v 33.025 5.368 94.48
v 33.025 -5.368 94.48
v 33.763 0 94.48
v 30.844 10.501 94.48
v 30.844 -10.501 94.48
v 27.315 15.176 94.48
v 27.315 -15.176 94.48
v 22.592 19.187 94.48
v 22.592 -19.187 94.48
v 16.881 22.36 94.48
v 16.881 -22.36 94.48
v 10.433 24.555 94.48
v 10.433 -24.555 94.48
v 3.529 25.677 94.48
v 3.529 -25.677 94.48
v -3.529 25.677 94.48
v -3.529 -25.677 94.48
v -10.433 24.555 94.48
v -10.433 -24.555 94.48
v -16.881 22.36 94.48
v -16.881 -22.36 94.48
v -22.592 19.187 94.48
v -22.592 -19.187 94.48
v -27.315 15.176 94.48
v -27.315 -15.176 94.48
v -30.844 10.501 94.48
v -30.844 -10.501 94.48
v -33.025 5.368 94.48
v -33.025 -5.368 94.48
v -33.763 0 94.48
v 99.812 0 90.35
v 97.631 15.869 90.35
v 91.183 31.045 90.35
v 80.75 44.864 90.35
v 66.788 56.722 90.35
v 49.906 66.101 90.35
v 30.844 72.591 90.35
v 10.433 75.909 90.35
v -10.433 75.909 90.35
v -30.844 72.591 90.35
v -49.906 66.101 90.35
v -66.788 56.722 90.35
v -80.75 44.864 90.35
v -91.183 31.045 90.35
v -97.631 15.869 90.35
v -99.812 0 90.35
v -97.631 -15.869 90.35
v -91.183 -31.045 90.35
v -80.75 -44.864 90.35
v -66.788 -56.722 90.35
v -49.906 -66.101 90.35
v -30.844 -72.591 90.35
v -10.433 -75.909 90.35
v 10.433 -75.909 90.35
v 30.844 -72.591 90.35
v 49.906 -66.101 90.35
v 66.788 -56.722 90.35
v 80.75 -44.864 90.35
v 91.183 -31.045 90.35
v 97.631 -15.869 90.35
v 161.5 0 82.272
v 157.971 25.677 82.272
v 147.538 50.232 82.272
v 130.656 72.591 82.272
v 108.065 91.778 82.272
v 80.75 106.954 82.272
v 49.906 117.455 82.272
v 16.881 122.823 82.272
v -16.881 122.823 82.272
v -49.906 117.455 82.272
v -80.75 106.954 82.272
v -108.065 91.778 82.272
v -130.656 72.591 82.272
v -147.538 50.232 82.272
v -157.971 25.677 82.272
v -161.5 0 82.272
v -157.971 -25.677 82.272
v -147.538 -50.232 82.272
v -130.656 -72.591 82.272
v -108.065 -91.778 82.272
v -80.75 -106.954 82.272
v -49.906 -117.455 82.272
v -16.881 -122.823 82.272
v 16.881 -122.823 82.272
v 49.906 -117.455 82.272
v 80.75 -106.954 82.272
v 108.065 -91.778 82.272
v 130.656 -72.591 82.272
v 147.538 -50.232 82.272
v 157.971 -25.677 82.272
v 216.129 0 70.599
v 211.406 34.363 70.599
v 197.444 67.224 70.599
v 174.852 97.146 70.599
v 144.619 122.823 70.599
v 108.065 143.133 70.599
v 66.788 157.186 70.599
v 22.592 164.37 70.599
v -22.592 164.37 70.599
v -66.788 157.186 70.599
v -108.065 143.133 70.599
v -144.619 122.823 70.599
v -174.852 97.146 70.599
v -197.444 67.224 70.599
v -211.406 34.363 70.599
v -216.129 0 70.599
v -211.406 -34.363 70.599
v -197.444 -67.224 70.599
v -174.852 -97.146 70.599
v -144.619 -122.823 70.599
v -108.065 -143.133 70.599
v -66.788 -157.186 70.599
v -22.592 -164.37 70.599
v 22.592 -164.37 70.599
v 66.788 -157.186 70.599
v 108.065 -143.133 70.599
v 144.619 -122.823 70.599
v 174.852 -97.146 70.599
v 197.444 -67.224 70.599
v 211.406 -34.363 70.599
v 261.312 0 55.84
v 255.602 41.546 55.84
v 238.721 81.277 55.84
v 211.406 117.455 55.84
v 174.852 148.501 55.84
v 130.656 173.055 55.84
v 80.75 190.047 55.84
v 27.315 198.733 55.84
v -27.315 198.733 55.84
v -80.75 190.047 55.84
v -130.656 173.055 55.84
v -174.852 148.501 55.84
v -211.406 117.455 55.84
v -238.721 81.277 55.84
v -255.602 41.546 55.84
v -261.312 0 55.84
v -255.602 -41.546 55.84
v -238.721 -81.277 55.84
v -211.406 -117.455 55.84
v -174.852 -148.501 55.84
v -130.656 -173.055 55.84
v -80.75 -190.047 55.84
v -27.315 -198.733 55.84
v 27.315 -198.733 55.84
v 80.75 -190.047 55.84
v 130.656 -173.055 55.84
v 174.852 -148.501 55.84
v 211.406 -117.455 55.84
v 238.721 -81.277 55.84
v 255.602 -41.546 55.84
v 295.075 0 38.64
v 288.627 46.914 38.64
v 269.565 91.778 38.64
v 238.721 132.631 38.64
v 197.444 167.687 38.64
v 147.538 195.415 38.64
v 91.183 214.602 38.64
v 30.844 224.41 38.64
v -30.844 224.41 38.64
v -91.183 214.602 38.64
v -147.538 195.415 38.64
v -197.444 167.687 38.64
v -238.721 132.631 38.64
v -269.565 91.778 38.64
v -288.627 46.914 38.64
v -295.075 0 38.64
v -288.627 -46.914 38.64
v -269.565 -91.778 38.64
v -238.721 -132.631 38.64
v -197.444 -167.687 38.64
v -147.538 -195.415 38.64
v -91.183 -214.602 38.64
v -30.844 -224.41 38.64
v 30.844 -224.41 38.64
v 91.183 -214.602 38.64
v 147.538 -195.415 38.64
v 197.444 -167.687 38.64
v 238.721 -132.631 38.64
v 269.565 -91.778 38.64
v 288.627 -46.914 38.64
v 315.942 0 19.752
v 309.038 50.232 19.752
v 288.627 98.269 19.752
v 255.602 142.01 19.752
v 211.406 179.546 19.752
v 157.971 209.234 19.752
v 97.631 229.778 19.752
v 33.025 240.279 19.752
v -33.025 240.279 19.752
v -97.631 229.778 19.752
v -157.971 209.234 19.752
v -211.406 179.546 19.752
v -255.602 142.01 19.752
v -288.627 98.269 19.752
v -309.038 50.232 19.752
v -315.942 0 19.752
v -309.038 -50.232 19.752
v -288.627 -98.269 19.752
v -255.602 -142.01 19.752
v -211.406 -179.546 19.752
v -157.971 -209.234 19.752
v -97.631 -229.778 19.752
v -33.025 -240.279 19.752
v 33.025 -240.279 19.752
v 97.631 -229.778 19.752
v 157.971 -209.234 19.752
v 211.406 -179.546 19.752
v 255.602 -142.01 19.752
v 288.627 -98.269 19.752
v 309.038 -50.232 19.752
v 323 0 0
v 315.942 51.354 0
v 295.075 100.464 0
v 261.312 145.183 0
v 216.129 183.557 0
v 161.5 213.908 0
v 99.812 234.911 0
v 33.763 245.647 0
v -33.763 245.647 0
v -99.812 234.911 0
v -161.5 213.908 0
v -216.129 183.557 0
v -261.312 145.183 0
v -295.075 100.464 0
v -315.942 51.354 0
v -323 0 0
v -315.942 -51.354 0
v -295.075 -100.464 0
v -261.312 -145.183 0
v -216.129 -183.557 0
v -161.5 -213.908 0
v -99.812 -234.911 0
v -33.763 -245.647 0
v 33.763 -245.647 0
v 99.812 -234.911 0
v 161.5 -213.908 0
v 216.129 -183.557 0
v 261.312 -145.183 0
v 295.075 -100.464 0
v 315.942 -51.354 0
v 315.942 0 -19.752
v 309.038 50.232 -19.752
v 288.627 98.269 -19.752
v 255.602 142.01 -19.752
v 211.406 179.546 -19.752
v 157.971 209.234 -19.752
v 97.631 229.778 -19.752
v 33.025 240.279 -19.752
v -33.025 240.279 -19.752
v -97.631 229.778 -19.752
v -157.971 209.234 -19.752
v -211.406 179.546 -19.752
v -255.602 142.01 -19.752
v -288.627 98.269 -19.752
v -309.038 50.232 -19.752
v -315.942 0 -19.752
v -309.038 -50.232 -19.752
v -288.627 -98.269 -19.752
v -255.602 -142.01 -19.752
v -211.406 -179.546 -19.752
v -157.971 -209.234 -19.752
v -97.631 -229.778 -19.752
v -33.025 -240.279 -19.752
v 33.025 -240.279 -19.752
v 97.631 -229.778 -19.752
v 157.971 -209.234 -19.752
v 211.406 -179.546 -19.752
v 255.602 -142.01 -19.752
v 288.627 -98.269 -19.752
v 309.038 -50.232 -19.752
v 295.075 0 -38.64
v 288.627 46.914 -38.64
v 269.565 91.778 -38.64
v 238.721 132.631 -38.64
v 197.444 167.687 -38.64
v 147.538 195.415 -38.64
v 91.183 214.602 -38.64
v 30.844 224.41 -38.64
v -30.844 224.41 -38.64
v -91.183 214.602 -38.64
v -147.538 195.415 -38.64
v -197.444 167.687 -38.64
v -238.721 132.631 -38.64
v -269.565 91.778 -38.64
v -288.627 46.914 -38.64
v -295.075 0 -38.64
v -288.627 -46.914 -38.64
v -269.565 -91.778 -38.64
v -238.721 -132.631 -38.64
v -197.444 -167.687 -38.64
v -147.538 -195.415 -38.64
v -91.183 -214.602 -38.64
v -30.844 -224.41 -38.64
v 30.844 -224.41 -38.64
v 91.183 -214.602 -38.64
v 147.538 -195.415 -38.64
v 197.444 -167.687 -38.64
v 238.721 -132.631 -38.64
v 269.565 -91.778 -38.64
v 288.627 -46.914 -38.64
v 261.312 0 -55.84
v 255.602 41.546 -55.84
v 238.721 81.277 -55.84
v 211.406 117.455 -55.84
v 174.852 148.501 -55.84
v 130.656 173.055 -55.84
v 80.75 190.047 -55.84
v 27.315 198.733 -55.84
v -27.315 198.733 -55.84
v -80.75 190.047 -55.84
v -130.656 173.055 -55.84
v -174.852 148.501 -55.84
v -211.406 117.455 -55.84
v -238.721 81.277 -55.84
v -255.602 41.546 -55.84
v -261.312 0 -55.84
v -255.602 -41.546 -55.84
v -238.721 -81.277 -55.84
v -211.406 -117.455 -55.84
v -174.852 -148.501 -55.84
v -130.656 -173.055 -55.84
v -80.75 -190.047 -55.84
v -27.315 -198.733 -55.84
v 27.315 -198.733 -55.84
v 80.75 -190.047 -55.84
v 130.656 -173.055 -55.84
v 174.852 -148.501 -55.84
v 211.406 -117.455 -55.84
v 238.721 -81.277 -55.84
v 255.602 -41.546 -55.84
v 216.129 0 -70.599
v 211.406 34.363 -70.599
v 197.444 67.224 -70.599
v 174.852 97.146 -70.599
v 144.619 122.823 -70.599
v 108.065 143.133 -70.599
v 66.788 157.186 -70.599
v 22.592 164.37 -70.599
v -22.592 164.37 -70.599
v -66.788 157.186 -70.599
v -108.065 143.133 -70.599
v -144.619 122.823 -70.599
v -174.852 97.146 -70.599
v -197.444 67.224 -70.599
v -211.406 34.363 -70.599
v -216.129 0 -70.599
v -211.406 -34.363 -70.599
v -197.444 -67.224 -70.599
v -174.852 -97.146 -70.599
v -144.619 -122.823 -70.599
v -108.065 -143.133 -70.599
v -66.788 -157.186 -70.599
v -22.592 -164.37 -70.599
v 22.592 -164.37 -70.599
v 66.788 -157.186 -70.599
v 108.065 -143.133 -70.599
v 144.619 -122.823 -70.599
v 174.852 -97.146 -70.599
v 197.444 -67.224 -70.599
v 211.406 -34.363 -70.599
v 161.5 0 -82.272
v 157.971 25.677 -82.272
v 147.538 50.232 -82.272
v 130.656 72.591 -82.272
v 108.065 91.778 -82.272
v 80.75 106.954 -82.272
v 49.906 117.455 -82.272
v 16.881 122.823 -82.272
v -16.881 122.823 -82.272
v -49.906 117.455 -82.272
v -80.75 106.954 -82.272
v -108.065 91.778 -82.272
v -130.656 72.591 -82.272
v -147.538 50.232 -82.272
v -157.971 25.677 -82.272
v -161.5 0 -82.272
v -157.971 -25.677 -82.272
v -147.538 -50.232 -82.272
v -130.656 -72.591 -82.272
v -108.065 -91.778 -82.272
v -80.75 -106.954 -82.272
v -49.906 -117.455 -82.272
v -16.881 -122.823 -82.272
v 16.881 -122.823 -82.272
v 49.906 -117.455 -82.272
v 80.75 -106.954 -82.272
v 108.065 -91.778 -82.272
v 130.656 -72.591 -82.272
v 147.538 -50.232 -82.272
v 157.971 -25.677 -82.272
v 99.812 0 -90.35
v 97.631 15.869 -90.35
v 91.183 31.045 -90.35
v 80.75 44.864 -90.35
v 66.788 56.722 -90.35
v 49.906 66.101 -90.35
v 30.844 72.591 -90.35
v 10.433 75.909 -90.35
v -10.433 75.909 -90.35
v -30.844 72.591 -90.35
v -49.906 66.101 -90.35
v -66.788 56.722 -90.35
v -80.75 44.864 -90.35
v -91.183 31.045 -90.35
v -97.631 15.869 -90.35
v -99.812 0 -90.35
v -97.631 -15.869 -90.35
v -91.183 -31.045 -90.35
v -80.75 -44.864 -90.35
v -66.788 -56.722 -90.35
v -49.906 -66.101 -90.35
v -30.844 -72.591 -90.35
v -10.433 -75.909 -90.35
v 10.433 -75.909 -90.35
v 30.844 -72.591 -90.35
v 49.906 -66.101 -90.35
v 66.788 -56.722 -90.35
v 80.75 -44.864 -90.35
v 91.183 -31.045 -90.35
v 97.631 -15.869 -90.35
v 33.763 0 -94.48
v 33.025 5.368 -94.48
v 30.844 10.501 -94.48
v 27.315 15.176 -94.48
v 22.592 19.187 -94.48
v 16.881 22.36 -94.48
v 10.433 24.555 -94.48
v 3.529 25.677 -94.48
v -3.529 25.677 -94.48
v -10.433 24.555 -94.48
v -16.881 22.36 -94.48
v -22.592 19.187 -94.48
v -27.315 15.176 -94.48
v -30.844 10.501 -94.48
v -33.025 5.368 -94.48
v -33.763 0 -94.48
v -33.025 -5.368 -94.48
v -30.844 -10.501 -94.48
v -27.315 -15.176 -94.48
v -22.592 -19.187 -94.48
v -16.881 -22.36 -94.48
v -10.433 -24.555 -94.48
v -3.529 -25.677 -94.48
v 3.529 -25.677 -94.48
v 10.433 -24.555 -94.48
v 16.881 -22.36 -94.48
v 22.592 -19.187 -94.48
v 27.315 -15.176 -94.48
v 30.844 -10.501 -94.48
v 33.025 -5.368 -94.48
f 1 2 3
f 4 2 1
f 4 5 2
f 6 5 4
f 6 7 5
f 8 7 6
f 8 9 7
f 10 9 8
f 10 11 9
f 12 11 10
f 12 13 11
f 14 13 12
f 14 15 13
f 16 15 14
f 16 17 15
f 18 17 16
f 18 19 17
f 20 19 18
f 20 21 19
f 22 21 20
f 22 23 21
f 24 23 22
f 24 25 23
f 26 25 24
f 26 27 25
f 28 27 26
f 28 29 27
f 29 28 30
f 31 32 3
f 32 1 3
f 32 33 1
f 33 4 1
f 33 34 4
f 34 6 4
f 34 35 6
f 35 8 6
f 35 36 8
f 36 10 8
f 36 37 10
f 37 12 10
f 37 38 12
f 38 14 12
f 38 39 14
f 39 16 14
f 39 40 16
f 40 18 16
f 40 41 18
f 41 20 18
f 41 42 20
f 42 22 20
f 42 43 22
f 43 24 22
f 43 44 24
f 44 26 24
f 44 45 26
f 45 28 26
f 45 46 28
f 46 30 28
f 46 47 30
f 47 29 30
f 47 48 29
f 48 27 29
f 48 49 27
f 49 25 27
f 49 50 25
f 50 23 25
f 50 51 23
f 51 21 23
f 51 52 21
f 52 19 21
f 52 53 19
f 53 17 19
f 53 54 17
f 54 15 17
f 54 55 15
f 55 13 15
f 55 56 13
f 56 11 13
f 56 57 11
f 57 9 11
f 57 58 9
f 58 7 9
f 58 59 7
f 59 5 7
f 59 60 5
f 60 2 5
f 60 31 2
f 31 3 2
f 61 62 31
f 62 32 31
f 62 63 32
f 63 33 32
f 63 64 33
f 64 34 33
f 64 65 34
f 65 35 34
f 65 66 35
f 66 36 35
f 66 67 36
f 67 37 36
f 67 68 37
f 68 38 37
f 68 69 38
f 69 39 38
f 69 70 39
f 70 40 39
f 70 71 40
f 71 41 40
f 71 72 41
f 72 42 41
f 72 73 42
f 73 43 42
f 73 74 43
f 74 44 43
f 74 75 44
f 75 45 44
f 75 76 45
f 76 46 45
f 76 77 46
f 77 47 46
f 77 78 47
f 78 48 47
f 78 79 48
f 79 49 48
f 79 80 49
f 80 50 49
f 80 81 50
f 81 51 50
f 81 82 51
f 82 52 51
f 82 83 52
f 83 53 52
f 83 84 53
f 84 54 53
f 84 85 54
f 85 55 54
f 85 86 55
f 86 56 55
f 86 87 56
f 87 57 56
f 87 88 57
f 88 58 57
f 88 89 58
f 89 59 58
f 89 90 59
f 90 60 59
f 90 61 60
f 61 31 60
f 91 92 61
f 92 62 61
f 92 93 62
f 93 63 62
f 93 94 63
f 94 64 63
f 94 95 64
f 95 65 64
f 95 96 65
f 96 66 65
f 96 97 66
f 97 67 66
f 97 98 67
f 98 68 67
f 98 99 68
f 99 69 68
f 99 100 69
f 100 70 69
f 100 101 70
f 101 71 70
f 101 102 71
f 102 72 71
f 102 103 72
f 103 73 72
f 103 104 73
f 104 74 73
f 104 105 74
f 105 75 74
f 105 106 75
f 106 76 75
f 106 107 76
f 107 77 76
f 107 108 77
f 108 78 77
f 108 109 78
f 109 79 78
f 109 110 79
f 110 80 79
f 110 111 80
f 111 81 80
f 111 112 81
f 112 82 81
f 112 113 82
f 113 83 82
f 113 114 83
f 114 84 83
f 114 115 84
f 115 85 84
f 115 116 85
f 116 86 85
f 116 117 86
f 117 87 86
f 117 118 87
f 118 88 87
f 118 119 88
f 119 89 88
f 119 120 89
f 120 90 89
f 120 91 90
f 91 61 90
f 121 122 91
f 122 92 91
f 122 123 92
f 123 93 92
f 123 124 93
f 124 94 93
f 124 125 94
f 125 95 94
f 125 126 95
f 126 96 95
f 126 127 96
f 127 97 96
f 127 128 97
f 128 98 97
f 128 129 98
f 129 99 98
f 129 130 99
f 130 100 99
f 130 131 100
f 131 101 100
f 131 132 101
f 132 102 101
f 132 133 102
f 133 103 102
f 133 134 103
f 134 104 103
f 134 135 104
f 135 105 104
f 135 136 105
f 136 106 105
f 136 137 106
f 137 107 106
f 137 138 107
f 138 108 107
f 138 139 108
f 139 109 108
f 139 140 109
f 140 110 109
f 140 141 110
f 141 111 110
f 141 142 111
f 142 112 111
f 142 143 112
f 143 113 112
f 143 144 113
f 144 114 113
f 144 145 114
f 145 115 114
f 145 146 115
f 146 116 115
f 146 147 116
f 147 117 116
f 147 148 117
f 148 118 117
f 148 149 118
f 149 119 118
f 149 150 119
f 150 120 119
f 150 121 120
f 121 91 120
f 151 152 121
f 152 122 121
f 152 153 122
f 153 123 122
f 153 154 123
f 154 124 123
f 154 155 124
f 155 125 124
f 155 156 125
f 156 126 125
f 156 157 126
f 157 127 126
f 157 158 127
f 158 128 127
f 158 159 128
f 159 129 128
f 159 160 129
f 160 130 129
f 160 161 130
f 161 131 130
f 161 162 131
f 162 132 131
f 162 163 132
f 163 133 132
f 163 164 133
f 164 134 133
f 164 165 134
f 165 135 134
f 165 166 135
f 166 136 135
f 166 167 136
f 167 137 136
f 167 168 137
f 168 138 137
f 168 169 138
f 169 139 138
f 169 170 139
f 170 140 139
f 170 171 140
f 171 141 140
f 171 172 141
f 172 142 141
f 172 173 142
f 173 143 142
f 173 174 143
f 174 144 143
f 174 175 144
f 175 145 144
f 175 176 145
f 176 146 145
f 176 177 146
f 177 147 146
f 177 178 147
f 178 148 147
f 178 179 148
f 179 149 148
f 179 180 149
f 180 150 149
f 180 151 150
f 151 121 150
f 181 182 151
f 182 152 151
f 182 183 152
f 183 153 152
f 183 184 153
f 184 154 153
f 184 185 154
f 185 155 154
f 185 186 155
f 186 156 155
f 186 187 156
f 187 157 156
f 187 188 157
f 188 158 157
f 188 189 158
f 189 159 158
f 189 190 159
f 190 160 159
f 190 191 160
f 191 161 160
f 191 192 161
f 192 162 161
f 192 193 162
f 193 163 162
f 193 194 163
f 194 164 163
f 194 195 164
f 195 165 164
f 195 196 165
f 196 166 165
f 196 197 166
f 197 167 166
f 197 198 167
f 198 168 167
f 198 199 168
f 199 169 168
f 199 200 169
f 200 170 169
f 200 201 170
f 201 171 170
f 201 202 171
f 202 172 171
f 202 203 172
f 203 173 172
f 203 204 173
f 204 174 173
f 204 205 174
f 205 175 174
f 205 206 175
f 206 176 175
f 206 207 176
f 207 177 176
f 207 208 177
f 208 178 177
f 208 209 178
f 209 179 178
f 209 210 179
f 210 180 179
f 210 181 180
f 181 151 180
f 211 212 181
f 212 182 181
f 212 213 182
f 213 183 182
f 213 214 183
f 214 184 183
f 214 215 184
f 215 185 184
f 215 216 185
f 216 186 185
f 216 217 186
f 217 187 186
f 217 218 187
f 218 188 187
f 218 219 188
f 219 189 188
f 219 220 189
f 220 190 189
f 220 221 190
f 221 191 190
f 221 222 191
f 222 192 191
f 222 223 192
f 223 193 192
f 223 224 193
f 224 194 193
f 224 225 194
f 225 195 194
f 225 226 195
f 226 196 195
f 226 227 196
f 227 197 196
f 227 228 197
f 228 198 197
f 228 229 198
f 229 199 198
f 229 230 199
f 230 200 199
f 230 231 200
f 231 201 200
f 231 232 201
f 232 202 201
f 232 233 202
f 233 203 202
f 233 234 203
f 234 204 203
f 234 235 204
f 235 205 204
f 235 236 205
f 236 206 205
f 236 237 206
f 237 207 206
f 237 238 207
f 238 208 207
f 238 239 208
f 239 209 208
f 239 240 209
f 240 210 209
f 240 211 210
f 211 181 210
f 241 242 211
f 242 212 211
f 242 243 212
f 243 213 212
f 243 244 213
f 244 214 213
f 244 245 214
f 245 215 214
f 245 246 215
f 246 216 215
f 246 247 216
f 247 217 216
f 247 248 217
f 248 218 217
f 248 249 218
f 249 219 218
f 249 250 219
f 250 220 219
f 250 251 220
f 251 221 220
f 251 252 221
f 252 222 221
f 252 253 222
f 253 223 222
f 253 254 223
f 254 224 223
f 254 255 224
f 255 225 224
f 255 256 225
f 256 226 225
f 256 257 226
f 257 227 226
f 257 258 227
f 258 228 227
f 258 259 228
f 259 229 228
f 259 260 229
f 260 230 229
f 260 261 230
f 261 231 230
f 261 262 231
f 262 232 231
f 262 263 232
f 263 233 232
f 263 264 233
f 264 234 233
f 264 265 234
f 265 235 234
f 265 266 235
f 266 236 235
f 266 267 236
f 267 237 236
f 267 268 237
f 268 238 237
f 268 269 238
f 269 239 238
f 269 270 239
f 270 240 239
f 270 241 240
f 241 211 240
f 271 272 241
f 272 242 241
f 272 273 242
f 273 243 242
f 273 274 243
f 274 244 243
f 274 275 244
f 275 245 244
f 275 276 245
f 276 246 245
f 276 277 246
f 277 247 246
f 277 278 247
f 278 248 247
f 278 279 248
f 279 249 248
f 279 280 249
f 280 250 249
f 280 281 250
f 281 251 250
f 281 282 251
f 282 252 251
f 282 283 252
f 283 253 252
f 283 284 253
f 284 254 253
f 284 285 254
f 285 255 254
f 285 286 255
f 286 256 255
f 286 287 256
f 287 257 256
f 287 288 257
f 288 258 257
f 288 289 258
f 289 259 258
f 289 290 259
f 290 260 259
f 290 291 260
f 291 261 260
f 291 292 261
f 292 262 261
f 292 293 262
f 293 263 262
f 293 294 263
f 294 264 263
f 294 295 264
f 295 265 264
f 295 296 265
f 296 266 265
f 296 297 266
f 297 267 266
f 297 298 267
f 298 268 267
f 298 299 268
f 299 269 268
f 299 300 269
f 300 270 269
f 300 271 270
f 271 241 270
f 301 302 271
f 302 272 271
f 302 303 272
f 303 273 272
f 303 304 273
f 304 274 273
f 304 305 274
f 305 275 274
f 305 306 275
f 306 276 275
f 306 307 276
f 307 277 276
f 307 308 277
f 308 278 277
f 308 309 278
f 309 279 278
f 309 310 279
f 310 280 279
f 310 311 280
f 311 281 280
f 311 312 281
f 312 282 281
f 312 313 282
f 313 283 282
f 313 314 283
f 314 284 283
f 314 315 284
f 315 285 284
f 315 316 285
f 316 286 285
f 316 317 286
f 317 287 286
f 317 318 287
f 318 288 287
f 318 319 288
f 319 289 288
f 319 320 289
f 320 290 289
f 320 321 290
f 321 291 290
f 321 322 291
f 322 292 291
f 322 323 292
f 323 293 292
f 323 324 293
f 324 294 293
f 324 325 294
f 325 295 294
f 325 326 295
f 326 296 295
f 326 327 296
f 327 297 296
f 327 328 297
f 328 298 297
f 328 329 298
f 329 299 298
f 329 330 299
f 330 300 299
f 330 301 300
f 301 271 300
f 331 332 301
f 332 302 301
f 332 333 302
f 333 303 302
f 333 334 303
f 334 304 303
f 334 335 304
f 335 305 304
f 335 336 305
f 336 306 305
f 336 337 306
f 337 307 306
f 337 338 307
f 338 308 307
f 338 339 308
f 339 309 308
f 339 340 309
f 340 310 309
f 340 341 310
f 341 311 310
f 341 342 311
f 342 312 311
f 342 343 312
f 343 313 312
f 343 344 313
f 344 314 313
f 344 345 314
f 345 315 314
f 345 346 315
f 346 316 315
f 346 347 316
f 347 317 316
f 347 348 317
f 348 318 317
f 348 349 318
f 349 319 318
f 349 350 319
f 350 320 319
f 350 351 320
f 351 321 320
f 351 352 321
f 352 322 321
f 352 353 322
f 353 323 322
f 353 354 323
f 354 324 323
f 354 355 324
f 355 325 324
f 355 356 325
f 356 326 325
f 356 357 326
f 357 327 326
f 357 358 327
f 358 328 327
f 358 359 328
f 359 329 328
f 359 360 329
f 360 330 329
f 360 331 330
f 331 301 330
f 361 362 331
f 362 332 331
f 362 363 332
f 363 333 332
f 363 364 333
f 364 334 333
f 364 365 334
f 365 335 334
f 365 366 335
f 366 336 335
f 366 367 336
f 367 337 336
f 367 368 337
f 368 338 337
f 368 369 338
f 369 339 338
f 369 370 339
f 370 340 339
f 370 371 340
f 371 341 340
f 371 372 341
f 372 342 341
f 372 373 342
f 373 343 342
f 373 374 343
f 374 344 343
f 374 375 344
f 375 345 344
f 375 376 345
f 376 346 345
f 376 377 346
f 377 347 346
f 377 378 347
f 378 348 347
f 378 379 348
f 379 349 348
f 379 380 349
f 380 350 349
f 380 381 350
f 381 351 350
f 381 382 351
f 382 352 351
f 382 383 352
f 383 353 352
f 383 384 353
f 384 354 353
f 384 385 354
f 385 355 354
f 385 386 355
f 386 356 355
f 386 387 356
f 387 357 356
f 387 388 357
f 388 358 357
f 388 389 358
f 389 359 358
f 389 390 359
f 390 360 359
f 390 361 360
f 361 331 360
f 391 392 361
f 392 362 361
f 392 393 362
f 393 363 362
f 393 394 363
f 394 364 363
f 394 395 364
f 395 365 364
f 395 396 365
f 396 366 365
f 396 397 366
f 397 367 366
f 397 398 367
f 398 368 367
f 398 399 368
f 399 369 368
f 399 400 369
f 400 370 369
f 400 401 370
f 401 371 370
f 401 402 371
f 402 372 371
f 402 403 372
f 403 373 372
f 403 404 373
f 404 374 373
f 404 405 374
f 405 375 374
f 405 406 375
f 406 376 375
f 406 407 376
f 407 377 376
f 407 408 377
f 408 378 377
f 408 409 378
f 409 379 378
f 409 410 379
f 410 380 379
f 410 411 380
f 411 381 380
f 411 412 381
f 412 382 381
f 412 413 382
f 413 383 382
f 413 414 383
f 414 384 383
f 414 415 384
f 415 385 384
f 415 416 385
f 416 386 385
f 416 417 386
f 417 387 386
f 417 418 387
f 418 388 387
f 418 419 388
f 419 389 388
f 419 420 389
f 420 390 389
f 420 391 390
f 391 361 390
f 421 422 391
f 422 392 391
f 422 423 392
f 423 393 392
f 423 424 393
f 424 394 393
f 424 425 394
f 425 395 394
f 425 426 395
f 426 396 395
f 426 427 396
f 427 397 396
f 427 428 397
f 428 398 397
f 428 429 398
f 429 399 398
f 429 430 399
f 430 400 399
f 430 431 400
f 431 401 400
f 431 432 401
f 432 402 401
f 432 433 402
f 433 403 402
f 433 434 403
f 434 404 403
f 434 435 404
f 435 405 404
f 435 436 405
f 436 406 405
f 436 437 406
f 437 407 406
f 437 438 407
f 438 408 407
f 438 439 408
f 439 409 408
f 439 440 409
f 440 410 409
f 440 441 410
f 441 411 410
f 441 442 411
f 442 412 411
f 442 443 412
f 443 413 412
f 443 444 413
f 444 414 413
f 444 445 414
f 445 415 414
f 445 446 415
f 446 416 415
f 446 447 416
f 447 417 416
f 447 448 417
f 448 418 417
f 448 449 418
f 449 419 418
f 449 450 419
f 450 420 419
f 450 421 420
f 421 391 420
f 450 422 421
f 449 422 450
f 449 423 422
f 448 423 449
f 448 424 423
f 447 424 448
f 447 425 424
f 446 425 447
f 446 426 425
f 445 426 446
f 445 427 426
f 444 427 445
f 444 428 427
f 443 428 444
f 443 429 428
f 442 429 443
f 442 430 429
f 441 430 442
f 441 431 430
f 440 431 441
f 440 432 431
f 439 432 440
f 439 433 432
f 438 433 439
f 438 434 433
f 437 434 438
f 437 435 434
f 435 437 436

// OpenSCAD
// Generated by SolidPython 1.0.1 on 2020-07-29 00:46:53


scale(v = [17, 13, 5]) {
	sphere(r = 19);
}
/***********************************************
*********      SolidPython code:      **********
************************************************
 
# import packages: SolidPython
from solid import *
from solid.utils import *
from itertools import chain, combinations, permutations


class Resize:

    def __init__(self, scad_file):
        self.scad_file = scad_file
        #self.scad_file = import_scad(scad_file)
        # cone/cylinder param:
        self.r1 = 0
        self.r2 = 0
        self.h = 0
        # rectangular prism param:
        self.w = 0
        self.l = 0
        # ellipse param:
        self.r = 0

    # import OpenScad code (file name corresponds to shape)


    # classify shape + parameters
    def assign(self, param1, param2, param3):
        if self.scad_file == 'cone.scad':
            self.r1 = param1
            self.r2 = param2
            self.h = param3
        elif self.scad_file == 'cylinder.scad':
            self.r1 = param1
            self.r2 = param2
            self.h = param3
        elif self.scad_file == 'rectangularPrism.scad':
            self.h = param1
            self.l = param2
            self.w = param3
        else:
            self.r = param1
            self.h = param2

    # resize parameters
    def iterate(self):
        x = range(3, 20, 2)
        i = 1
        if self.scad_file == 'cone.scad':
            tempList = list(permutations(x, 2))
            for temp in tempList:
                param1 = temp[0]
                param2 = temp[1]
                filepath = 'produced_scad_files/' + 'cone' + str(param1) + '_' + str(param2) + '_' + '.scad'
                scad_render_to_file(cylinder(h=param1, r1=param2, r2=0), filepath)

        elif self.scad_file == 'cylinder.scad':
            tempList = list(permutations(x, 3))
            for temp in tempList:
                param1 = temp[0]
                param2 = temp[1]
                filepath = 'produced_scad_files/' + 'cylinder' + str(param1) + '_' + str(param2) + '_' + '.scad'
                scad_render_to_file(cylinder(h=param1, r1=param2, r2=param2), filepath)

        elif self.scad_file == 'rectangularPrism.scad':
            tempList = list(permutations(x, 3))
            for temp in tempList:
                param1 = temp[0]
                param2 = temp[1]
                param3 = temp[2]
                filepath = 'produced_scad_files/' + 'rectangularPrism' + str(param1) + '_' + str(param2) + '_' + str(
                    param3) + '.scad'
                scad_render_to_file(cube(size=(param1, param2, param3)), filepath)

        elif self.scad_file == 'ellipse.scad':
            tempList = list(permutations(x, 4))
            for temp in tempList:
                param1 = temp[0]
                param2 = temp[1]
                param3 = temp[2]
                param4 = temp[3]
                filepath = 'produced_scad_files/' + 'ellipse' + str(param1) + '_' + str(param2) + '_' + str(param3) + '_' + str(param4) + '.scad'
                scad_render_to_file(scale([param1, param2, param3])(sphere(r=param4)), filepath)

    def render_to_scadfile(self):
        scad_render_to_file(scad, 'example.scad') 
 
************************************************/
